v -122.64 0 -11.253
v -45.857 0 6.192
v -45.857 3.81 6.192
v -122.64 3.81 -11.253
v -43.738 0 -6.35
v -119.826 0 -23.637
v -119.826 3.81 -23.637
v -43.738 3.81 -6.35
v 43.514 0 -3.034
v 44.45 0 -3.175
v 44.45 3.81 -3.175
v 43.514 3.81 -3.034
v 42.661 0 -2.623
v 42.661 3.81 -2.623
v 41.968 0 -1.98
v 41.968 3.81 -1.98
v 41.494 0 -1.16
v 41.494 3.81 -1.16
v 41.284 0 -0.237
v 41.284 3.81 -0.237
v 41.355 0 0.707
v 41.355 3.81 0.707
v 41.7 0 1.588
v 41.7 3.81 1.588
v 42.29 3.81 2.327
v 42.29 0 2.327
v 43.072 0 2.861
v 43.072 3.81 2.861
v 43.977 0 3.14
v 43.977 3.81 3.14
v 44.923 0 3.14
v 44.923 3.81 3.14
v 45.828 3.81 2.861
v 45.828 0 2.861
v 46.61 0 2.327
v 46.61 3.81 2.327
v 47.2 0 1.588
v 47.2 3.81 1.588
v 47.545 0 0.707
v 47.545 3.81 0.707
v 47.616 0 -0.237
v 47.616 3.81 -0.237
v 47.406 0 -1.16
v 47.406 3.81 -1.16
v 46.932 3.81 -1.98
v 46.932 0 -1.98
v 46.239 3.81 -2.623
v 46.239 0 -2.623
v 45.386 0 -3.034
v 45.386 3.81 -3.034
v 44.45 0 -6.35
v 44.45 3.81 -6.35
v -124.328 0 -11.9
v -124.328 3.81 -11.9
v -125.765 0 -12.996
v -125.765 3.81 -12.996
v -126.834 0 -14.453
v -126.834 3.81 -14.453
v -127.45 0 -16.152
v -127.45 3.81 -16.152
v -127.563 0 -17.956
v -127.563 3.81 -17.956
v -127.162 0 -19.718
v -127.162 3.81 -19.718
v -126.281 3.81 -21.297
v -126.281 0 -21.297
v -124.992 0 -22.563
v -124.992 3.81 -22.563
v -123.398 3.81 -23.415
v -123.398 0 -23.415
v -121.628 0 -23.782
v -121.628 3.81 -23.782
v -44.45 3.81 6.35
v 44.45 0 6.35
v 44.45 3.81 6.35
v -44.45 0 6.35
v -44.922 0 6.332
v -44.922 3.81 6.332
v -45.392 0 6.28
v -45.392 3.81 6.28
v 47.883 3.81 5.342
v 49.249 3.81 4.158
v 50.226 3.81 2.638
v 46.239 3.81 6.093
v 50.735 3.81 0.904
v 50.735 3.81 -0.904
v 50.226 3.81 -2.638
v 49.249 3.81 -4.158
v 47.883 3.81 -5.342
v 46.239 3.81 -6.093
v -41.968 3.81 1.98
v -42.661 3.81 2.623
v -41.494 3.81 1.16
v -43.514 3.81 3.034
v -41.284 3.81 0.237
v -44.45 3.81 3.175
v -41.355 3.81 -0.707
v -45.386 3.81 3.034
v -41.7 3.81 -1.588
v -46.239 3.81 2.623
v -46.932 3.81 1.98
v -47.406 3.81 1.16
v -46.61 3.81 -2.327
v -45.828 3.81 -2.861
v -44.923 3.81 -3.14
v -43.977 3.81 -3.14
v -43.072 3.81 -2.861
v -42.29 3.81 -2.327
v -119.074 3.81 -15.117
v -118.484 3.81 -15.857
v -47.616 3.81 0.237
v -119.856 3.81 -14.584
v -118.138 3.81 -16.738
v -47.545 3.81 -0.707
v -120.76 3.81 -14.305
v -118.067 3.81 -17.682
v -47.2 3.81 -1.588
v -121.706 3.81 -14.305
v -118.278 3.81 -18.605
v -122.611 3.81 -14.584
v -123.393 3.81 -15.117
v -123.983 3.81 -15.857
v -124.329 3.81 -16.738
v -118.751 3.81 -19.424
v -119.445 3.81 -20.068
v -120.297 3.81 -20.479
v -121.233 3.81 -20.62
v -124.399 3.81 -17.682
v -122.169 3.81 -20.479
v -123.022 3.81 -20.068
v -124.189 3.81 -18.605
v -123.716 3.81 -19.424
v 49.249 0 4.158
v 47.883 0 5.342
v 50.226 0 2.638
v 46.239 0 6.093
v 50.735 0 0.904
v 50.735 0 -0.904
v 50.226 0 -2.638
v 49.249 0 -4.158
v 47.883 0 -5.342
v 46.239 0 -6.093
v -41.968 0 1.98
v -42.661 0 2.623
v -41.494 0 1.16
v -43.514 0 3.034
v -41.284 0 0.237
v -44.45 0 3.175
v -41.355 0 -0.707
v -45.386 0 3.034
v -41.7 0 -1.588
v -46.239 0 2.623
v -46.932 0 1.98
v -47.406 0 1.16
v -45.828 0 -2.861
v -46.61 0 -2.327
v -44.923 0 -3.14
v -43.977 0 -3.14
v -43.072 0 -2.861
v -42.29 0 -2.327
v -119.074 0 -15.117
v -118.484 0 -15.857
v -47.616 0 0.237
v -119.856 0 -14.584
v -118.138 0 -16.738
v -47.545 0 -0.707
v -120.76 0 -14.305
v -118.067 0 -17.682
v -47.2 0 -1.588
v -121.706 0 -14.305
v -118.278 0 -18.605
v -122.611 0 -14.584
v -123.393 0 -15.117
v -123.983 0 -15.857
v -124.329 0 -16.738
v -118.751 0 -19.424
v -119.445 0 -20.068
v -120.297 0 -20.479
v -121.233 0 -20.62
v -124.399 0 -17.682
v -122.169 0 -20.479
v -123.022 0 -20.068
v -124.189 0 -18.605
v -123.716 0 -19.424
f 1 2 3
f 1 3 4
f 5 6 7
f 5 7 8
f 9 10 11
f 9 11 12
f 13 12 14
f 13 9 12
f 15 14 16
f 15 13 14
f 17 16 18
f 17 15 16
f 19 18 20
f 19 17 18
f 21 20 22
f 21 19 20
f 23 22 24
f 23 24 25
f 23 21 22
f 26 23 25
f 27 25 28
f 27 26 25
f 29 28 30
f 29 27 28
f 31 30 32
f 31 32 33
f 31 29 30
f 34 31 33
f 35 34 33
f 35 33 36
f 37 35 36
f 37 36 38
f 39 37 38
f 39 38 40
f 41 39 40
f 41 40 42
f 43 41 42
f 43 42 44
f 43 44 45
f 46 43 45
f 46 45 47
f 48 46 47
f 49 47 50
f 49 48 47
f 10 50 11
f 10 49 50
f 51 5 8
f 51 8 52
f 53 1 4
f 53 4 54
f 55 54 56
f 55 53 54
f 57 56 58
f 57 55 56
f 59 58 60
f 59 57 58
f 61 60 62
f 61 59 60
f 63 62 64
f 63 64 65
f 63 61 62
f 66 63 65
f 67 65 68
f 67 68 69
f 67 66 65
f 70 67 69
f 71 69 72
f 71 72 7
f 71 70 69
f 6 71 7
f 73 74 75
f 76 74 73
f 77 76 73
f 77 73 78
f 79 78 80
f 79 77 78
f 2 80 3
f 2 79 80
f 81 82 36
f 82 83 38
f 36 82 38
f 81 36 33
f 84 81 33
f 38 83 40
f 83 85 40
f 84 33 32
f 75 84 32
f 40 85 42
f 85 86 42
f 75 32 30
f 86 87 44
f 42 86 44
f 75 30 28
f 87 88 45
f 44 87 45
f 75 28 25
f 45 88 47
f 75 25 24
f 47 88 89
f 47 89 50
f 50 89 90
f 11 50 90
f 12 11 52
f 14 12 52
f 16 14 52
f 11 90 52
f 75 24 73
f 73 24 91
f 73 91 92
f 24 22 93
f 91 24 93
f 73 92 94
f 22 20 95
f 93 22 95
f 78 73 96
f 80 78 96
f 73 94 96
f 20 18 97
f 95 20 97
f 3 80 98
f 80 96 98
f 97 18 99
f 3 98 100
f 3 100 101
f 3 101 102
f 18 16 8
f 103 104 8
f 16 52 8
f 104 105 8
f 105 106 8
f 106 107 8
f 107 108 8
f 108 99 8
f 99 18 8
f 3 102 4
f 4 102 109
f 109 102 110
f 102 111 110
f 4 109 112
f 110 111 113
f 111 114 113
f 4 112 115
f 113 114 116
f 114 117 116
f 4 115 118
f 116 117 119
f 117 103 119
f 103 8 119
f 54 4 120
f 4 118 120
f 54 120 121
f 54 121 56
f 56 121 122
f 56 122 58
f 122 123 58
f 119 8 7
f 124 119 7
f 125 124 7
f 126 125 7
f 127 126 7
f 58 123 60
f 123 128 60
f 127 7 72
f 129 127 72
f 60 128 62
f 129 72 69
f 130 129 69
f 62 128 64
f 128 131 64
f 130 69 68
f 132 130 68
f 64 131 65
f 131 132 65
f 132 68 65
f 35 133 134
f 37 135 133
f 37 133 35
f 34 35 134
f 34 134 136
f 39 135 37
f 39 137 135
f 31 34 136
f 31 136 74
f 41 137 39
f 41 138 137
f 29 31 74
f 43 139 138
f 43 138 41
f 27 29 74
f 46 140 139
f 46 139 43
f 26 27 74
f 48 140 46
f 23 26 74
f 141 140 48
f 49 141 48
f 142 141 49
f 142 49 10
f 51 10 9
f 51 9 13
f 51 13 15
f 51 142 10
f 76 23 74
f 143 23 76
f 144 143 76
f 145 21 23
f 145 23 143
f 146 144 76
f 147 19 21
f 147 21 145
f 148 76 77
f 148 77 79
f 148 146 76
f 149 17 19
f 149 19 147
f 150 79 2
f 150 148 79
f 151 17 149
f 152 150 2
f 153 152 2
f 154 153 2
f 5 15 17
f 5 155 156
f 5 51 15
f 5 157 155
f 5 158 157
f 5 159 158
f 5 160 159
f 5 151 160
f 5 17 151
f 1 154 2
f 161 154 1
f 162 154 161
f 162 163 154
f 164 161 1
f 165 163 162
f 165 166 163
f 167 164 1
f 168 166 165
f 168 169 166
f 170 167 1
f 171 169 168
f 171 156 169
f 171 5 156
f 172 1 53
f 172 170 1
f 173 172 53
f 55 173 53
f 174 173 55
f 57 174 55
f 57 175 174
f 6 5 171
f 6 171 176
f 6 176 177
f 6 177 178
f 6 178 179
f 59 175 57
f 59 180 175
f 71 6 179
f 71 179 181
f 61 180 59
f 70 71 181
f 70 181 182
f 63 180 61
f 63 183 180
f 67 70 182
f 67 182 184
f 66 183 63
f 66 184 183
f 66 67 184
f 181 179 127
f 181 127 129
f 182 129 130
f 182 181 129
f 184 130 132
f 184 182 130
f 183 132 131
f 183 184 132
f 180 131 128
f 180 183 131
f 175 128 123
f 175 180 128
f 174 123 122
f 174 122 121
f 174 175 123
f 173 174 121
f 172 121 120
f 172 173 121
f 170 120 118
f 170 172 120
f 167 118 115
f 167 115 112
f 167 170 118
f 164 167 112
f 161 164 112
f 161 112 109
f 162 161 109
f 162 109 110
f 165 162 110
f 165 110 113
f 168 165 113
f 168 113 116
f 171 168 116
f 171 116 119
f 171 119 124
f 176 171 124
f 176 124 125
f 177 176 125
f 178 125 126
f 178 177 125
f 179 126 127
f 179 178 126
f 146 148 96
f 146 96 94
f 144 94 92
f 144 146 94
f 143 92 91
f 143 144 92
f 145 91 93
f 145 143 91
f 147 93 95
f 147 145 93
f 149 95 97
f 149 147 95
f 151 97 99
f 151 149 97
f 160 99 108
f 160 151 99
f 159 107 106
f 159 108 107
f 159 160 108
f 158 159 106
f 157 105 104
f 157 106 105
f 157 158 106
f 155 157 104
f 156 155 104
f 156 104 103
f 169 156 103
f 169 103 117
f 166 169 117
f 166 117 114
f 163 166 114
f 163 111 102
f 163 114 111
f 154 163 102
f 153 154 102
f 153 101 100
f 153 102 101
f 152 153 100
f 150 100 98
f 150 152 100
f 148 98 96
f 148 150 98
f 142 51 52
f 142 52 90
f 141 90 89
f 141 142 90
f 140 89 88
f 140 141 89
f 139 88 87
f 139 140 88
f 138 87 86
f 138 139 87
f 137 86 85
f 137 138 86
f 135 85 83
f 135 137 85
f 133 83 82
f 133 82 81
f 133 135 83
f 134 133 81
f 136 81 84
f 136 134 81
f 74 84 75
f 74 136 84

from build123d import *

# Parameters (mm, degrees)
SKETCH2_R               = 3.175
BOSS_EXTRUDE2_DEPTH     = 3.81
SKETCH1_R               = 3.175
BOSS_EXTRUDE3_DEPTH     = 3.81
CUT_EXTRUDE1_DEPTH      = 130.839106153
CUT_EXTRUDE1_DEPTH_BACK = 130.839106153
SKETCH3_R               = 3.175


with BuildPart() as part:
    # Sketch2 → Boss-Extrude2 (new body)
    with BuildSketch(Plane(origin=(0, 0, 0), x_dir=(1, 0, 0), z_dir=(0, 1, 0))):
        with BuildLine():
            Line((-45.85683296, -6.1921984), (-122.640093118, 11.252530303))
            ThreePointArc((-122.640093118, 11.252530303), (-127.425458558, 18.851561662), (-119.826427198, 23.636927102))
            Line((-119.826427198, 23.636927102), (-43.04316704, 6.1921984))
            ThreePointArc((-43.04316704, 6.1921984), (-38.2578016, -1.40683296), (-45.85683296, -6.1921984))
        make_face()
        with Locations(Location((-121.233260158, 17.444728703, 0), (0, 0, 90))):
            Circle(SKETCH2_R, mode=Mode.SUBTRACT)
    extrude(amount=BOSS_EXTRUDE2_DEPTH)

    # Sketch1 → Boss-Extrude3 (add)
    with BuildSketch(Plane(origin=(0, 0, 0), x_dir=(1, 0, 0), z_dir=(0, 1, 0))):
        with BuildLine():
            Line((-44.45, 6.35), (44.45, 6.35))
            ThreePointArc((44.45, 6.35), (50.8, 0), (44.45, -6.35))
            Line((44.45, -6.35), (-44.45, -6.35))
            ThreePointArc((-44.45, -6.35), (-50.8, 0), (-44.45, 6.35))
        make_face()
        with Locations(Location((44.45, 0, 0), (0, 0, 90))):
            Circle(SKETCH1_R, mode=Mode.SUBTRACT)
    extrude(amount=BOSS_EXTRUDE3_DEPTH)

    # Sketch3 → Cut-Extrude1 (cut, two sides: drawn at the far end of the back side and taken through both)
    with BuildSketch(Plane(origin=(0, 3.81, 0), x_dir=(1, 0, 0), z_dir=(0, 1, 0)).offset(-CUT_EXTRUDE1_DEPTH_BACK)):
        with Locations(Location((-44.45, 0, 0), (0, 0, 270))):
            Circle(SKETCH3_R)
    extrude(amount=CUT_EXTRUDE1_DEPTH + CUT_EXTRUDE1_DEPTH_BACK, mode=Mode.SUBTRACT)


solid = part.part
